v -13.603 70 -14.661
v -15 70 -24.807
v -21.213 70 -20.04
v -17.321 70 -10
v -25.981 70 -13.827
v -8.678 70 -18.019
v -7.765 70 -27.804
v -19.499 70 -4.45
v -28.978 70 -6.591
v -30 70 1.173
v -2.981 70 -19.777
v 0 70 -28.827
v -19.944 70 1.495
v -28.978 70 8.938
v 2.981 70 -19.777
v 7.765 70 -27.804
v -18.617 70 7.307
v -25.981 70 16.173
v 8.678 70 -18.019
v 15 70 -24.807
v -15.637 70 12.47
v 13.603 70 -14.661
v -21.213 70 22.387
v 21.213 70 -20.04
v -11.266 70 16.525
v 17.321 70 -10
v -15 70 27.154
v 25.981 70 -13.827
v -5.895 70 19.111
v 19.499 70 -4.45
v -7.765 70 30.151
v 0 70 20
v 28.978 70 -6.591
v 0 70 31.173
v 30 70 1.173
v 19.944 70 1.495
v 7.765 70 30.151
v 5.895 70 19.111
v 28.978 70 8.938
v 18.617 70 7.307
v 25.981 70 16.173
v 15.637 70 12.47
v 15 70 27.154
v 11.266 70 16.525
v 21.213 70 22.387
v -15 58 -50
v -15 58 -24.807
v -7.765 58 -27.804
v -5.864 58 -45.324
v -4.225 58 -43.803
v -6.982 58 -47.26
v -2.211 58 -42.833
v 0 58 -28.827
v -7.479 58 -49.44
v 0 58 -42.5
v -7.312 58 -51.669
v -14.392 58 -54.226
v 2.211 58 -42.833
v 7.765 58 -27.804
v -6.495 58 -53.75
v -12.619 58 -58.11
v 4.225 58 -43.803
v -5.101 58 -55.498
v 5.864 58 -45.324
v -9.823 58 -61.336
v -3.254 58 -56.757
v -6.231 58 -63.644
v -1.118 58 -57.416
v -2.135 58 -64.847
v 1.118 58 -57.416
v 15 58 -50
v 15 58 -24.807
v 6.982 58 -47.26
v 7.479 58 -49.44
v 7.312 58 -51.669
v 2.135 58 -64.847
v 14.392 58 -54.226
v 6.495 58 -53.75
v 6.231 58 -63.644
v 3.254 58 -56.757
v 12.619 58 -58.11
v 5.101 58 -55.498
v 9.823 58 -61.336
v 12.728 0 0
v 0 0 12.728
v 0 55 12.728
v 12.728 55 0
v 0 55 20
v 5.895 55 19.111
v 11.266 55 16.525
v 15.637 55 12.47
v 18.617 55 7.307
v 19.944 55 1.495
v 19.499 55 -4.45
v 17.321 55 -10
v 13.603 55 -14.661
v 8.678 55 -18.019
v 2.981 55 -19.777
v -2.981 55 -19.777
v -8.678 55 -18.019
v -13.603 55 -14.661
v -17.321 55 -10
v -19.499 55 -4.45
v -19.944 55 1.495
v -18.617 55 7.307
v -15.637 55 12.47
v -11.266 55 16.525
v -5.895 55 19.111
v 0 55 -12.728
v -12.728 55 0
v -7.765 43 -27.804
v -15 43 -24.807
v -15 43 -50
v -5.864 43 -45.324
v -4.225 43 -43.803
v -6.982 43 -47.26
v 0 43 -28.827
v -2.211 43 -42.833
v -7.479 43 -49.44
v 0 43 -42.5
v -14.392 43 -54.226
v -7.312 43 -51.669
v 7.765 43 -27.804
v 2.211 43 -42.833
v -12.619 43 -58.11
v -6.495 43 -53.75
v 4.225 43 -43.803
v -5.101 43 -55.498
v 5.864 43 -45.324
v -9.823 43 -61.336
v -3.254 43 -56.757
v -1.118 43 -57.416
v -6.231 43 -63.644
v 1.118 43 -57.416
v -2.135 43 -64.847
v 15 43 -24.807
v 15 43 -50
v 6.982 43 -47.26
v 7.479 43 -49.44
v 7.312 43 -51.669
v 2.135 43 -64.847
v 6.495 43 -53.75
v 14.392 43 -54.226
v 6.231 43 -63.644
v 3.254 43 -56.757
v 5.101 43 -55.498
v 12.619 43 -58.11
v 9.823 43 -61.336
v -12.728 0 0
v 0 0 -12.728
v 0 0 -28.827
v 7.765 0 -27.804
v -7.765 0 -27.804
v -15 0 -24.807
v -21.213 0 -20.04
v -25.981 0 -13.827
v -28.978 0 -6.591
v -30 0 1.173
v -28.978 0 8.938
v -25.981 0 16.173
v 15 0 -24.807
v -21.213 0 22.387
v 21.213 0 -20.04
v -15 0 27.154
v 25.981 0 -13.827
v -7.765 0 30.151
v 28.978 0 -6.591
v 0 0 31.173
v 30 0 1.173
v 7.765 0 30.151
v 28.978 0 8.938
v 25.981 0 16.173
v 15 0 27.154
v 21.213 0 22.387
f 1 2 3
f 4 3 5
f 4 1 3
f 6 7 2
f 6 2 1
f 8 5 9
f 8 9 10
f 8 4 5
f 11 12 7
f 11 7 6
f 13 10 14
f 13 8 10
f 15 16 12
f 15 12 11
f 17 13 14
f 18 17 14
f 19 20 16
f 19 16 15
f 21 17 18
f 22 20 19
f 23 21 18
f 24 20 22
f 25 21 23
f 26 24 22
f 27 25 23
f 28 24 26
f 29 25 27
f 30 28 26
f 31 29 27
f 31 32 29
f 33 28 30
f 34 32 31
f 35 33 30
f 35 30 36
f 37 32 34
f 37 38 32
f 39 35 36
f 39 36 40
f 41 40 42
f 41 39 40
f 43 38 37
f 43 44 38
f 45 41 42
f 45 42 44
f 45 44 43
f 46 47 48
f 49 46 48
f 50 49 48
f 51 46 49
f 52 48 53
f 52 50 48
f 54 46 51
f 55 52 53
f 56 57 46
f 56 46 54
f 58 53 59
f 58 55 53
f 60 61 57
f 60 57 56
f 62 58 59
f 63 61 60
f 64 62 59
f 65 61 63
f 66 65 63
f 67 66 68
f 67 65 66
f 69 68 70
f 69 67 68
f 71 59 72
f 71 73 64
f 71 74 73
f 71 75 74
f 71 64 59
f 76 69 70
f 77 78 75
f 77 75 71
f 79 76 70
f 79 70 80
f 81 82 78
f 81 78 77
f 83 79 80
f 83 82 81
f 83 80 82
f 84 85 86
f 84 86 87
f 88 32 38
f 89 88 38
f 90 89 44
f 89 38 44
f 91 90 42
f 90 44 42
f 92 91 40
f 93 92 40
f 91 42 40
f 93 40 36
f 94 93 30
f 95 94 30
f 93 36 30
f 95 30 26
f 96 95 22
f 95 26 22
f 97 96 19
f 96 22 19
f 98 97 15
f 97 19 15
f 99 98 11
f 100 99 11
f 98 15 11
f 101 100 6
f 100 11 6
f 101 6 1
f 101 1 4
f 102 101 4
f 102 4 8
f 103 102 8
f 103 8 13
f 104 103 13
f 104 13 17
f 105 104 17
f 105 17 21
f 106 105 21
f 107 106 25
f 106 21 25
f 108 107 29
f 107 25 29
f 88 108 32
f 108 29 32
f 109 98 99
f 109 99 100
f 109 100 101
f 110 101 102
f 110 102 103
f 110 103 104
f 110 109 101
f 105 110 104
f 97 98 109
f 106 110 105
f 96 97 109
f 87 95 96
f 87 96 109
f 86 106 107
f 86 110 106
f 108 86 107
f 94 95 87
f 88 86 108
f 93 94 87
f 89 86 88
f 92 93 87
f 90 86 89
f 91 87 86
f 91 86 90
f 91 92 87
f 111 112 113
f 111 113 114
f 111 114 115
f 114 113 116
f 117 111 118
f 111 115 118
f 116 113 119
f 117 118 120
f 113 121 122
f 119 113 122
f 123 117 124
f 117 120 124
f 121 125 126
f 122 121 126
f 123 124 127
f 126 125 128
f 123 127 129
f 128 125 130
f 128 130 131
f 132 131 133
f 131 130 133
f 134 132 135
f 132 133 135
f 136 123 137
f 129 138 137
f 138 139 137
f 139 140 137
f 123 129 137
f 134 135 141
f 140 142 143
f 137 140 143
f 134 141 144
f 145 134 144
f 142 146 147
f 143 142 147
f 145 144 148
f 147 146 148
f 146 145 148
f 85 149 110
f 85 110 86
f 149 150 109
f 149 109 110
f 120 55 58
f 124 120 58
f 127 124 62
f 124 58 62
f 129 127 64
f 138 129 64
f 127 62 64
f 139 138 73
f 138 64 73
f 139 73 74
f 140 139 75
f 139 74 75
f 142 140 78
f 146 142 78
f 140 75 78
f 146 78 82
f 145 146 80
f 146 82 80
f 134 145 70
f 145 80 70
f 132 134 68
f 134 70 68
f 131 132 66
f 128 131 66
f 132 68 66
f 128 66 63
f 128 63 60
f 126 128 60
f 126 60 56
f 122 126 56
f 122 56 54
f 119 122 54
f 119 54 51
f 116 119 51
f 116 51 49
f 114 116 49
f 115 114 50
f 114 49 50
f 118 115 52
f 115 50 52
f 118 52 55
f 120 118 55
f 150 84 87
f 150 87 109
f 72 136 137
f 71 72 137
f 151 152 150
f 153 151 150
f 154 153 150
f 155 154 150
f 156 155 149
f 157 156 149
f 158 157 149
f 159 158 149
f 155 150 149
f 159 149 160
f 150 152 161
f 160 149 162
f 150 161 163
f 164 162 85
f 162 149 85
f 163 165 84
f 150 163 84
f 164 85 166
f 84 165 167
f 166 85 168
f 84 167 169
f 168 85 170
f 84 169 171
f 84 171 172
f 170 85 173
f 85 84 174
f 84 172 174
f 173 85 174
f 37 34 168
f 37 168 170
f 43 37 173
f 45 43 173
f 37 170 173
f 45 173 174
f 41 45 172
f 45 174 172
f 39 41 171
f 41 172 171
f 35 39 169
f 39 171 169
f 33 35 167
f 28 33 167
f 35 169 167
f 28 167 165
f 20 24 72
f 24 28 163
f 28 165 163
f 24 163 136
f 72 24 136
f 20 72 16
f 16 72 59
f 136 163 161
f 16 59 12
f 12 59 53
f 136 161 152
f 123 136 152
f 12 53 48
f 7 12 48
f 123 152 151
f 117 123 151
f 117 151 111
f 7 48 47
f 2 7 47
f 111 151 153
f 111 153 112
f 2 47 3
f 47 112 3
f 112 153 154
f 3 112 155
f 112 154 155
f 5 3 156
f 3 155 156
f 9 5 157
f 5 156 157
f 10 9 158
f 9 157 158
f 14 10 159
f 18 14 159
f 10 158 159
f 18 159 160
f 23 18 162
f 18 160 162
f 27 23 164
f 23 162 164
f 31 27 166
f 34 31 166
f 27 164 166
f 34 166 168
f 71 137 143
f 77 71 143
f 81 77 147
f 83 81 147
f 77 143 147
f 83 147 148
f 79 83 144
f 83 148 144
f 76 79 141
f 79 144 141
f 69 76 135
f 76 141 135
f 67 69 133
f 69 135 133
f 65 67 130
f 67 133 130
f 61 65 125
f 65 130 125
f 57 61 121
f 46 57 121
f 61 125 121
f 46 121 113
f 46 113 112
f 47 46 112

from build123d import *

# Parameters (mm, degrees)
SKETCH_2_R          = 30
EXTRUDE_1_DEPTH     = 70
SKETCH_3_R          = 20
CUT_EXTRUDE_2_DEPTH = 15
CUT_EXTRUDE_3_DEPTH = 55
EXTRUDE_START       = 43
EXTRUDE_2_DEPTH     = 15
SKETCH_7_R          = 7.5
CUT_EXTRUDE_4_DEPTH = 15


with BuildPart() as part:
    # 草图2 → 凸台-拉伸1 (new body)
    with BuildSketch(Plane(origin=(0, 0, 0), x_dir=(1, 0, 0), z_dir=(0, 1, 0))):
        with Locations(Location((0, -1.173457716, 0), (0, 0, 270))):
            Circle(SKETCH_2_R)
    extrude(amount=EXTRUDE_1_DEPTH)

    # 草图3 → 切除-拉伸2 (cut)
    with BuildSketch(Plane(origin=(0, 70, 0), x_dir=(1, 0, 0), z_dir=(0, 1, 0))):
        with Locations(Location((0, 0, 0), (0, 0, 270))):
            Circle(SKETCH_3_R)
    extrude(amount=-CUT_EXTRUDE_2_DEPTH, mode=Mode.SUBTRACT)

    # 草图5 → 切除-拉伸3 (cut)
    with BuildSketch(Plane.XZ):
        Polygon((0, 12.727922061), (12.727922061, 0), (0, -12.727922061), (-12.727922061, 0), align=None)
    extrude(amount=-CUT_EXTRUDE_3_DEPTH, mode=Mode.SUBTRACT)

    # 草图6 → 凸台-拉伸2 (add)
    with BuildSketch(Plane(origin=(0, 0, 0), x_dir=(1, 0, 0), z_dir=(0, 1, 0)).offset(EXTRUDE_START)):
        with BuildLine():
            Line((-15, 50), (-15, 24.807304398))
            ThreePointArc((-15, 24.807304398), (0, 28.826542284), (15, 24.807304398))
            Line((15, 24.807304398), (15, 50))
            ThreePointArc((15, 50), (0, 65), (-15, 50))
        make_face()
    extrude(amount=EXTRUDE_2_DEPTH)

    # 草图7 → 切除-拉伸4 (cut)
    with BuildSketch(Plane(origin=(0, 58, 0), x_dir=(1, 0, 0), z_dir=(0, 1, 0))):
        with Locations(Location((0, 50, 0), (0, 0, 270))):
            Circle(SKETCH_7_R)
    extrude(amount=-CUT_EXTRUDE_4_DEPTH, mode=Mode.SUBTRACT)


solid = part.part
